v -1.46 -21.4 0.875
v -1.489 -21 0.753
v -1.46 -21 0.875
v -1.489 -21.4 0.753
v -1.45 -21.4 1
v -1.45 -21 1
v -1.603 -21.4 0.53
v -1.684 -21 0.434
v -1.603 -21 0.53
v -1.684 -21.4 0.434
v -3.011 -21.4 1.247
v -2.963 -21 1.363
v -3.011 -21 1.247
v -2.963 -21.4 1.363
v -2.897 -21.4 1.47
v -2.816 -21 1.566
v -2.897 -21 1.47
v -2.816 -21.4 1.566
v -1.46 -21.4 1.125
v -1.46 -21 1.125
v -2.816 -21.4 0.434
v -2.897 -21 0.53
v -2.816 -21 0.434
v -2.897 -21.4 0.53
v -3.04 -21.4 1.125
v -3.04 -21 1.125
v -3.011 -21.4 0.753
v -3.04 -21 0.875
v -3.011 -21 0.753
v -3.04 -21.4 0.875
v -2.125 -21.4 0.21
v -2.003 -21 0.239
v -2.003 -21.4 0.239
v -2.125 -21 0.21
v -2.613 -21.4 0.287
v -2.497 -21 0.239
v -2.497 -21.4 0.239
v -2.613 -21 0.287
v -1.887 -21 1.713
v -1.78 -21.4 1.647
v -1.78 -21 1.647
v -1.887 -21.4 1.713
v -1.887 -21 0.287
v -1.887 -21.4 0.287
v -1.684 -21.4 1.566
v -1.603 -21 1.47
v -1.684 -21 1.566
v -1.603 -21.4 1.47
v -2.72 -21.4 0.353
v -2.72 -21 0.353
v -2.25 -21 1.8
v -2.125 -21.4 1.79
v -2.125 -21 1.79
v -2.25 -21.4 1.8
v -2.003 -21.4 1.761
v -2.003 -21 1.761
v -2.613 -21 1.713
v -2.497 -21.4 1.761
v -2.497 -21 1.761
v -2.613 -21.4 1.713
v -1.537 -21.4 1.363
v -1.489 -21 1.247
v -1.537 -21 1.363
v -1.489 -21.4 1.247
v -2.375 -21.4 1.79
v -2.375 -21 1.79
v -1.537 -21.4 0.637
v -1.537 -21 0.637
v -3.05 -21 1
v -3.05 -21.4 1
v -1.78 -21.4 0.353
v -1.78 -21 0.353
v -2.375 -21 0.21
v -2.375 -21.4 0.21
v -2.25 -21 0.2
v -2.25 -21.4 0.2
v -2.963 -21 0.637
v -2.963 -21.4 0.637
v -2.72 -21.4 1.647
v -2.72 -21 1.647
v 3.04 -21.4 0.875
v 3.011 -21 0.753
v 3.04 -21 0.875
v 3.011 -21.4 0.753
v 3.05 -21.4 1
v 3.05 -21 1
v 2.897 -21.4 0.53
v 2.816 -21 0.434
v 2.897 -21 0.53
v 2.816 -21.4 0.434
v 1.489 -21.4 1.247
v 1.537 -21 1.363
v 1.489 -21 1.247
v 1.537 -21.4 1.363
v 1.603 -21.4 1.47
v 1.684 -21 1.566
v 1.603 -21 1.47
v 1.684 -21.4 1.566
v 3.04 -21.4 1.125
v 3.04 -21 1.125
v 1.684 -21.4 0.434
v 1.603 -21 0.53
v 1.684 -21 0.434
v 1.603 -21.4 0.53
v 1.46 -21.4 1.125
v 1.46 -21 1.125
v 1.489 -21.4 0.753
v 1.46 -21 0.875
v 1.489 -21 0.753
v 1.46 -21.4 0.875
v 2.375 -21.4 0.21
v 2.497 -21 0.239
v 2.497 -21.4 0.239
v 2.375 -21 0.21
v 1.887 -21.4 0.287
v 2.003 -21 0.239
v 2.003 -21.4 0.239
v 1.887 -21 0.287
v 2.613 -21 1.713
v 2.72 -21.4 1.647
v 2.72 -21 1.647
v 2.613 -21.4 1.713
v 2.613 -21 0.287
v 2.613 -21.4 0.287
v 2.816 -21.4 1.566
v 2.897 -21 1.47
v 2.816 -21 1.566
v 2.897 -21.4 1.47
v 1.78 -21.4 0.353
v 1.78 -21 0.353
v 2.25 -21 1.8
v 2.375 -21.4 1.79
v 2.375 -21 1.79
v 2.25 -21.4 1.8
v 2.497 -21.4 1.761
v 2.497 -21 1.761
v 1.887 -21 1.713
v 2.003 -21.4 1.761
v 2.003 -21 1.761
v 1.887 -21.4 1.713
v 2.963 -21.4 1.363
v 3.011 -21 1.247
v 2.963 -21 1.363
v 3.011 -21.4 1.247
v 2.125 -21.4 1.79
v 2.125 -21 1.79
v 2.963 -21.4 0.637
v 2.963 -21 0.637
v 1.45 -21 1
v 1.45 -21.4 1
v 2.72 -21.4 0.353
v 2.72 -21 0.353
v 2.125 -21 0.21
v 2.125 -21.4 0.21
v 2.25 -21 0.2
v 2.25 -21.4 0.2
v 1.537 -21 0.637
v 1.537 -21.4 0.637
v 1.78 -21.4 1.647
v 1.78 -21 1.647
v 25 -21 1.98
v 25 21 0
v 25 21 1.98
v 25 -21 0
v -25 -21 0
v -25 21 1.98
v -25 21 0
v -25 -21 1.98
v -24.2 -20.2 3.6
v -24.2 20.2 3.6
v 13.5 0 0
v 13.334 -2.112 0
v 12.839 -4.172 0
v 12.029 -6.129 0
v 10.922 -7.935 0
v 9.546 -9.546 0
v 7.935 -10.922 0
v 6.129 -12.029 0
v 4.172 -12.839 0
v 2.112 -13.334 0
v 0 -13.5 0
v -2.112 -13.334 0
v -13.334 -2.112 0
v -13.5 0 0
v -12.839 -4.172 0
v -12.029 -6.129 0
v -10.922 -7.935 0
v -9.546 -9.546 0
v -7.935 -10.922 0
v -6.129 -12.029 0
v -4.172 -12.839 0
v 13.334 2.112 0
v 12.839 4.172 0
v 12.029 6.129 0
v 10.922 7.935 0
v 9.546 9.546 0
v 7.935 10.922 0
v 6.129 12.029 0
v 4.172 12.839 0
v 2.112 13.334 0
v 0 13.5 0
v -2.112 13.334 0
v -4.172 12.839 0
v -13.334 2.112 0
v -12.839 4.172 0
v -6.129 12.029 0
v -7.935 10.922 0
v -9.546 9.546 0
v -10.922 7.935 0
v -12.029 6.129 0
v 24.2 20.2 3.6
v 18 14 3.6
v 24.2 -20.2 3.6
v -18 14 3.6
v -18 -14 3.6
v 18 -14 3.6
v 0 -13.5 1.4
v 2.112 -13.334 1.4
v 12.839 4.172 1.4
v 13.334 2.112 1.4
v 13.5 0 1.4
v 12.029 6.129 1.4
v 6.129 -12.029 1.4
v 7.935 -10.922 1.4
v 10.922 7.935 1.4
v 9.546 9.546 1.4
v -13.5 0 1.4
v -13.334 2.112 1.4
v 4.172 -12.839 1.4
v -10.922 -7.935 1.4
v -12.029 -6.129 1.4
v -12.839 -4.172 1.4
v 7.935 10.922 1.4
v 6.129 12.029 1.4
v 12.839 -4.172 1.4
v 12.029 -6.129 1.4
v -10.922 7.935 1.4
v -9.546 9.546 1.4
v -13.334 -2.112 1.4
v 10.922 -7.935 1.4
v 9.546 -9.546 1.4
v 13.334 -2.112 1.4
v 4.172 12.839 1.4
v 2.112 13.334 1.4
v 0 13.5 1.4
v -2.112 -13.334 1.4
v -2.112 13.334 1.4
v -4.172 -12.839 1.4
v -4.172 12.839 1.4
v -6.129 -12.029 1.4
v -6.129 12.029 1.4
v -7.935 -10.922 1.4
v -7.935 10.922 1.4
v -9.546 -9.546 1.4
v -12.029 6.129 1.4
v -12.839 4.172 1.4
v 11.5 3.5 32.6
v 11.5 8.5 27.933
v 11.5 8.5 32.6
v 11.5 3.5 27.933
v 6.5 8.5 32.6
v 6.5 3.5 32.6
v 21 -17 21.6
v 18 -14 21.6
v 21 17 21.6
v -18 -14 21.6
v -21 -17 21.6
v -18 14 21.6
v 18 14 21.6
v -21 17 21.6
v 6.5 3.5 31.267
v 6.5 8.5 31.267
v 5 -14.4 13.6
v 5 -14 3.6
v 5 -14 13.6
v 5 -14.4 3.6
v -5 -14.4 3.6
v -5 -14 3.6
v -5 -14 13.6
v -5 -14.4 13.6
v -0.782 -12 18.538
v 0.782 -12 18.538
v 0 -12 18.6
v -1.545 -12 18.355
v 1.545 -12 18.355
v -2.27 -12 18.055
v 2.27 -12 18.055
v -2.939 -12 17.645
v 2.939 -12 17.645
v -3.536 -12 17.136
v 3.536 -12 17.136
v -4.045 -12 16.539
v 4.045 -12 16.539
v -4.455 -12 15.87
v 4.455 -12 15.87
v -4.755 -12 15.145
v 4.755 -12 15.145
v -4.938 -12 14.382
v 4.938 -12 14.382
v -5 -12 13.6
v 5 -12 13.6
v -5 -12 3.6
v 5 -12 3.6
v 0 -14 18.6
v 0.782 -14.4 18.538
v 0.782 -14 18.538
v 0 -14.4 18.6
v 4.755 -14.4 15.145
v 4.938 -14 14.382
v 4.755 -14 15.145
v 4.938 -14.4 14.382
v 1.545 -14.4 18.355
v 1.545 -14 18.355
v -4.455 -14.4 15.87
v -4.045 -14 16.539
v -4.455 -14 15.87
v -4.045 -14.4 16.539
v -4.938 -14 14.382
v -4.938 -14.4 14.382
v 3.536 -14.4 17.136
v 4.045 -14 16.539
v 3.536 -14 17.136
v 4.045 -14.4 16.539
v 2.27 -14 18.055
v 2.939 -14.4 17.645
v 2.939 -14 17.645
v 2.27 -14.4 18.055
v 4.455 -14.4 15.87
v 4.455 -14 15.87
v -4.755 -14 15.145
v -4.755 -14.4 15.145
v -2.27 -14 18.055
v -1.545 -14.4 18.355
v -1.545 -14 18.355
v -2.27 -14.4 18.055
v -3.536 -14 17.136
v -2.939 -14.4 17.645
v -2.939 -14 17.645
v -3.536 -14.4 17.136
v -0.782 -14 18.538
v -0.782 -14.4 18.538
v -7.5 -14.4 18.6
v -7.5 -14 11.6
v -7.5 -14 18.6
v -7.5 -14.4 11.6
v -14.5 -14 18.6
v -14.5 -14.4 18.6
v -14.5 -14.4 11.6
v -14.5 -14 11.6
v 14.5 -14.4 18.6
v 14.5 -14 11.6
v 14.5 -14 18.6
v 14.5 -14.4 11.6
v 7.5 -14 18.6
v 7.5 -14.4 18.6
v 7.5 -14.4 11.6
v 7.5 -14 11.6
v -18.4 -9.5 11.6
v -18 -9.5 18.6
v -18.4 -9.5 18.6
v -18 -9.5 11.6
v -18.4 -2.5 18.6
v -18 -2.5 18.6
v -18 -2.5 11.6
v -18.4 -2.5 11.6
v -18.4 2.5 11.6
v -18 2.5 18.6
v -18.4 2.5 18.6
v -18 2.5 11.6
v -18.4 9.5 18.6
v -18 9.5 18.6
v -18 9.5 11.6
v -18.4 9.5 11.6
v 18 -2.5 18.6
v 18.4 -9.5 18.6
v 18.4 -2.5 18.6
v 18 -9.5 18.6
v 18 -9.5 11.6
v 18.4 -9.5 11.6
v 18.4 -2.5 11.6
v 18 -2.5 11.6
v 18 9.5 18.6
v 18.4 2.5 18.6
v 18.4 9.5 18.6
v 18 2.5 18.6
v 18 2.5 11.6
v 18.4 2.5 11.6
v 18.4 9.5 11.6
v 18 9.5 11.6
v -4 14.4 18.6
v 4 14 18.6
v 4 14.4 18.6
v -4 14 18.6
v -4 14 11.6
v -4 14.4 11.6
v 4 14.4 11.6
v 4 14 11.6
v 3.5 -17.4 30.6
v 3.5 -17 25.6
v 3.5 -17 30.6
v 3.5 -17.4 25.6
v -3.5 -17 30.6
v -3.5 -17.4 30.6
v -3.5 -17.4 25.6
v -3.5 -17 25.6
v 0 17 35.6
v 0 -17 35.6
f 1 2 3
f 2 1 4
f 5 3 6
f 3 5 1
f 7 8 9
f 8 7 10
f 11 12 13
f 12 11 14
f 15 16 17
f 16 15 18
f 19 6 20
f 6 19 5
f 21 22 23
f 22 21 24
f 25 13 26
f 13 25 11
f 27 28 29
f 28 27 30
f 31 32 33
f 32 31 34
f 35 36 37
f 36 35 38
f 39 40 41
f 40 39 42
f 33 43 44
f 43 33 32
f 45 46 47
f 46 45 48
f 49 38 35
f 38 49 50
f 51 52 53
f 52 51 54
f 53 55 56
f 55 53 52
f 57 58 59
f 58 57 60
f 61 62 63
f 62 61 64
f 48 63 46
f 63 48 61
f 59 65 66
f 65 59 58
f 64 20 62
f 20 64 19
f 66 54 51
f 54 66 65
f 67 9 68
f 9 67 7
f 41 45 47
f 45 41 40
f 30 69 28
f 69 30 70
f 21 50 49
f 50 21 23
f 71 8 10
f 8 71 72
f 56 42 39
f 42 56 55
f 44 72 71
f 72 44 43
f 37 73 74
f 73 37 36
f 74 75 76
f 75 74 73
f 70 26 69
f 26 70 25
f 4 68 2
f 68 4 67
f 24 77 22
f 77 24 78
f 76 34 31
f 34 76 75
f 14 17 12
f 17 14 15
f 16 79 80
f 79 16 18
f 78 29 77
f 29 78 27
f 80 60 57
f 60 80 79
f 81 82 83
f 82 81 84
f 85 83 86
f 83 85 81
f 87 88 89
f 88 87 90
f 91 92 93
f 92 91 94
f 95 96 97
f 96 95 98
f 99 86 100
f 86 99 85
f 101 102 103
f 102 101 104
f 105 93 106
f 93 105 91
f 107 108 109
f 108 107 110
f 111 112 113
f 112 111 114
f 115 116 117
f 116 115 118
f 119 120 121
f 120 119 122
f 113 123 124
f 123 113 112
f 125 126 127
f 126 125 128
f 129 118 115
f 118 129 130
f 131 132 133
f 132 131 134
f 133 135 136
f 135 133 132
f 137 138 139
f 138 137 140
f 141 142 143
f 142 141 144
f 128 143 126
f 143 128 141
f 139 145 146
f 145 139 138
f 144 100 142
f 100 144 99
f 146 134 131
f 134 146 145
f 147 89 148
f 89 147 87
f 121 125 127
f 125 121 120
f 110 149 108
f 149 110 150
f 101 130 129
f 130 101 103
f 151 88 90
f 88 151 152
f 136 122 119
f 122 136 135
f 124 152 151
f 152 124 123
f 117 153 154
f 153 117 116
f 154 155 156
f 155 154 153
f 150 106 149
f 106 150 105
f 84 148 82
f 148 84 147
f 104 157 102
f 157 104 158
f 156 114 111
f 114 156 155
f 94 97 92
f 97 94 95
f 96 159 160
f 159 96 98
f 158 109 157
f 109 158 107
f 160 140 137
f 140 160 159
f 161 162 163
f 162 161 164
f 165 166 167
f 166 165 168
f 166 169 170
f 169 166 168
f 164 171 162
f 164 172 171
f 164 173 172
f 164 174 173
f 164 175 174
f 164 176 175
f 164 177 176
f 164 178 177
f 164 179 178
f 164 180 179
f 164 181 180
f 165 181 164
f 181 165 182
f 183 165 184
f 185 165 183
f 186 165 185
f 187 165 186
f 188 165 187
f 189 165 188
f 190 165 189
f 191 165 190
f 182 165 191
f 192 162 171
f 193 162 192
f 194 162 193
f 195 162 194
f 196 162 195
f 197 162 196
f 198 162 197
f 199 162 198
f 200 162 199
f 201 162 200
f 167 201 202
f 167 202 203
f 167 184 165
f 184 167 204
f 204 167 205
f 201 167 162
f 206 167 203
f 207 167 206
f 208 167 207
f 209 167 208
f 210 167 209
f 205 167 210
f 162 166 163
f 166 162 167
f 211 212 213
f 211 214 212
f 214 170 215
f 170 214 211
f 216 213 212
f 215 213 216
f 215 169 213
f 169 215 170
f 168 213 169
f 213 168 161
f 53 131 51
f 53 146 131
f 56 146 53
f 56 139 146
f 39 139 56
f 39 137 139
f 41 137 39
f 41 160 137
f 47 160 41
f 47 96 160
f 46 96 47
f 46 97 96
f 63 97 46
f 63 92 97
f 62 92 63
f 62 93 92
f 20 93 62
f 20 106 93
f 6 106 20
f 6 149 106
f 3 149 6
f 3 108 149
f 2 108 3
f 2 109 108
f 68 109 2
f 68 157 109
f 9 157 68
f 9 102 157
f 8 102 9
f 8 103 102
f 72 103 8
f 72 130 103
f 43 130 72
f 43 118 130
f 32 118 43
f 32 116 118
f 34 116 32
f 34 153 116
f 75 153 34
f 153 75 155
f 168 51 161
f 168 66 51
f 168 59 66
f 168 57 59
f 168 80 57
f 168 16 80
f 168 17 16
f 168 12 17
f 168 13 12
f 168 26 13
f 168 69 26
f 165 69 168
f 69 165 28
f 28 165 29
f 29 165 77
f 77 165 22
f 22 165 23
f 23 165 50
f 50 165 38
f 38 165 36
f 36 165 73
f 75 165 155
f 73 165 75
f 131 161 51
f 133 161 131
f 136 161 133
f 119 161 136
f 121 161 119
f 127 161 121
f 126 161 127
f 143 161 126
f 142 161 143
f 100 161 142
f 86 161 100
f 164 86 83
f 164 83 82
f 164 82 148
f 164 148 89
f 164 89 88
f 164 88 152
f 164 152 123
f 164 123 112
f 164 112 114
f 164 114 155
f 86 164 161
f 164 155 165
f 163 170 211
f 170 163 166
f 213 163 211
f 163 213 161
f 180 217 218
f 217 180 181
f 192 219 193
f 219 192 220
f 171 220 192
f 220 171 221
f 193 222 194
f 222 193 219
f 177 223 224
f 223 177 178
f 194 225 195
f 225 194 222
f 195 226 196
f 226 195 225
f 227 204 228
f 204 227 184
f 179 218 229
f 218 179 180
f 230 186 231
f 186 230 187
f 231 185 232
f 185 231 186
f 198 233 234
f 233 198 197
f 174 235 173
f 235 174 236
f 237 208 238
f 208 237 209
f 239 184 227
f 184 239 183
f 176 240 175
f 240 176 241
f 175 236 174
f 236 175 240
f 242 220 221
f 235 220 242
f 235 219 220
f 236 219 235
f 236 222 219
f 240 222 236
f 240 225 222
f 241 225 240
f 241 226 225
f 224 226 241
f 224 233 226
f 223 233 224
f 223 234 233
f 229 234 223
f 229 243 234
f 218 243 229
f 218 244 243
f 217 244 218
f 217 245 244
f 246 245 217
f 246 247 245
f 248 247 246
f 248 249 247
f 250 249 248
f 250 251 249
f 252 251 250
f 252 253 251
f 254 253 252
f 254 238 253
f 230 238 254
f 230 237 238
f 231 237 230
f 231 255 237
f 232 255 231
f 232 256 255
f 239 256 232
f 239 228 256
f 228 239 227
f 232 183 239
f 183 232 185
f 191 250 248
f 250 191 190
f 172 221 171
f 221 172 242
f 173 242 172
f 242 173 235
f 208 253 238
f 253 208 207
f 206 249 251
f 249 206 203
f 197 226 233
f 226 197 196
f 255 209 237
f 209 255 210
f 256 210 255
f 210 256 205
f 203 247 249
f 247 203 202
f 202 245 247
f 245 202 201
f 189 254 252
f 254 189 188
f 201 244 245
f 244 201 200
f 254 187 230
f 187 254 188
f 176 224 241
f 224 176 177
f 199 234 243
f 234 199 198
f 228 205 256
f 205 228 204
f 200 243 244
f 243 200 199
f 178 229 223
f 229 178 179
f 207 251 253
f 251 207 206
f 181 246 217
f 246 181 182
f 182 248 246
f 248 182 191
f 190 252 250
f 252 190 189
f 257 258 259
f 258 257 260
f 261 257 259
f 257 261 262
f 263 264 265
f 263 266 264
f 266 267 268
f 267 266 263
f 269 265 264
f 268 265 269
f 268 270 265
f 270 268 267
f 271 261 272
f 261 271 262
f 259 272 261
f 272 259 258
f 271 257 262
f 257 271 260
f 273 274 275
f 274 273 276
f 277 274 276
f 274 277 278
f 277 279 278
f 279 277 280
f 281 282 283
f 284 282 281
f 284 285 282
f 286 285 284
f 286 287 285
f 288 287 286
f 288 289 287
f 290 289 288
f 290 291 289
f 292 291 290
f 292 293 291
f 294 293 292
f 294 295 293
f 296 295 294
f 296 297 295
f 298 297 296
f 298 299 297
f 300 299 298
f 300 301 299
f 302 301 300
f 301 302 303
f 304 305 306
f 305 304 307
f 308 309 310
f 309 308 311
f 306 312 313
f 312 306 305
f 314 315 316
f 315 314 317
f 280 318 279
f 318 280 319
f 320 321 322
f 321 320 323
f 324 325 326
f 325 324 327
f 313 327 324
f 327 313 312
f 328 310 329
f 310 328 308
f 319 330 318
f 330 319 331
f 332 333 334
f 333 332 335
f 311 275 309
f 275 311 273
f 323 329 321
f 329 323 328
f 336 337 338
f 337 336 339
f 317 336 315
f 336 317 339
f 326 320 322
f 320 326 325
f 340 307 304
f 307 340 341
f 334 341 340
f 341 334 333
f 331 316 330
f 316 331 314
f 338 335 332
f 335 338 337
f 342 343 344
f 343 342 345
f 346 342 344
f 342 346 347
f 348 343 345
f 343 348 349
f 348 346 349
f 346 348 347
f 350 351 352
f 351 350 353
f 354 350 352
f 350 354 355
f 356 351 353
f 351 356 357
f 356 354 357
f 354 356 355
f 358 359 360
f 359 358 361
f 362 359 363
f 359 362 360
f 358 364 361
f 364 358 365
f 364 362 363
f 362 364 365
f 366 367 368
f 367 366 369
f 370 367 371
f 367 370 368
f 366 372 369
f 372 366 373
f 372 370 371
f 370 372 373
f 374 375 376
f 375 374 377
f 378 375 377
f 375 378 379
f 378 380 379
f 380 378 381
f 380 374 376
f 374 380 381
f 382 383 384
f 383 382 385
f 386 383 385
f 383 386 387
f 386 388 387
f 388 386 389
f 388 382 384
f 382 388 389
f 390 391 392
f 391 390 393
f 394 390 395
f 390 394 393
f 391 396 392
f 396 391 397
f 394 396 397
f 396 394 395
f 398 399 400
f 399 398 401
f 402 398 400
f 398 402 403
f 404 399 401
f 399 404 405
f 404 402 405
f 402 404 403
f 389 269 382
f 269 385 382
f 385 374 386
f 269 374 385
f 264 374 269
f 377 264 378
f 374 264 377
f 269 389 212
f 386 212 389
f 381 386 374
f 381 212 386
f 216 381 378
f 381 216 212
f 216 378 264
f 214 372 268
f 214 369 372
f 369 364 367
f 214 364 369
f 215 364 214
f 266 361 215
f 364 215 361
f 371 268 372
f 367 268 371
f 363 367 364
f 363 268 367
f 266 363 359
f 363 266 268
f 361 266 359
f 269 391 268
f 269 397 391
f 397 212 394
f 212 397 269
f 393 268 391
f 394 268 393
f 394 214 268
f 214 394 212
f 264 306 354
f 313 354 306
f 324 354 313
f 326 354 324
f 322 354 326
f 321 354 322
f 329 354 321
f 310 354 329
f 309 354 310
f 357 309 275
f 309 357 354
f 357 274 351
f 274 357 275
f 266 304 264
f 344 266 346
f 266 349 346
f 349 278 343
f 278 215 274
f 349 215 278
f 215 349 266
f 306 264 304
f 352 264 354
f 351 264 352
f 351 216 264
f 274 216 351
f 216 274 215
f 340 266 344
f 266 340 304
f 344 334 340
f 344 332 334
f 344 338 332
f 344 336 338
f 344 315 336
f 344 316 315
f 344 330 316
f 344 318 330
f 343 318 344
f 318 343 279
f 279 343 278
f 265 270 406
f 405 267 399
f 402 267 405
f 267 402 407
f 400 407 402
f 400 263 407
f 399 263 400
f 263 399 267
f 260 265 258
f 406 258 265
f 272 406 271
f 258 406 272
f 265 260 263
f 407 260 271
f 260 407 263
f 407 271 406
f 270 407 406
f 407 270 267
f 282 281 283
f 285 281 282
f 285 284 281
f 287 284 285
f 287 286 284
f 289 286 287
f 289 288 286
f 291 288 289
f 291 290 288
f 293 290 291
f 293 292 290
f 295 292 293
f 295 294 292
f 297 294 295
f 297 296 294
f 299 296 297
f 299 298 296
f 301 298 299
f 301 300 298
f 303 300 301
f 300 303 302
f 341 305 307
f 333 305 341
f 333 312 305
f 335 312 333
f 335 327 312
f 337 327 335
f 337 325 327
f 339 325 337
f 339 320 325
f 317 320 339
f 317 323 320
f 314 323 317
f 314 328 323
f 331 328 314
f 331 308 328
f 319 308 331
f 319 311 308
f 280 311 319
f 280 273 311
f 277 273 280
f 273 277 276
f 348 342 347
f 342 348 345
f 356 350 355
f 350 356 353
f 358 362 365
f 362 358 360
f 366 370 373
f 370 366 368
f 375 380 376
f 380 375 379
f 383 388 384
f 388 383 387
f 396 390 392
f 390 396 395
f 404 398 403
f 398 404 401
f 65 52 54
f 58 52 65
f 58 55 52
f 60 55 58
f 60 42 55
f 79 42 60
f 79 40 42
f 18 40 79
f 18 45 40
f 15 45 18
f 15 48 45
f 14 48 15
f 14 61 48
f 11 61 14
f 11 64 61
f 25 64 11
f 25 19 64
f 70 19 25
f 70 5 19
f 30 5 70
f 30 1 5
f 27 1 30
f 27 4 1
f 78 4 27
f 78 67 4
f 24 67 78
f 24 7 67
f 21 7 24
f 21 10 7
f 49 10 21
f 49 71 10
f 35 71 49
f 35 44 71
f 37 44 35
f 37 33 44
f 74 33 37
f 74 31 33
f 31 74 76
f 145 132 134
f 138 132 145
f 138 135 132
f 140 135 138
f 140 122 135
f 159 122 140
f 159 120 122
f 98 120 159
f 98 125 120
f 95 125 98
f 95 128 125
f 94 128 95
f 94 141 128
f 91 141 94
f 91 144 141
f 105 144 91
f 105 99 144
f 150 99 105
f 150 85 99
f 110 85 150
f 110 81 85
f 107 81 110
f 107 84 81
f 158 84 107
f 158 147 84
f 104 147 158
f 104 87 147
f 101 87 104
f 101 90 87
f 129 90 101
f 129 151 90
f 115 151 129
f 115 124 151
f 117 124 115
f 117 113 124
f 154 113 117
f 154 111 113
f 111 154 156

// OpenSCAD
// file: lib.scad
// BDL Pets - gemeinsame Bausteine fuer die 5 Haus-Stufen
//
// Alle Haeuser sind in genau 4 Farbslots aufgeteilt (Multicolor-Druck, z.B. Bambu AMS / Prusa MMU):
//   1 Stein/Sockel   2 Waende   3 Dach   4 Akzente (Tueren, Fenster, Pfosten, Stufen-Punkte)
// Die Teile ueberlappen nicht (Oeffnungen werden aus der einen Farbe geschnitten und in der anderen gefuellt),
// jeder Farbslot laesst sich einzeln als STL exportieren:  openscad -D part=1 -o x_c1.stl house-1-huette.scad
//   part = 0 -> Vorschau in Farbe, 1..4 -> nur dieser Farbslot
//
// Unten (Sockel) ist mittig eine runde Ausnehmung fuer einen NFC-Sticker (Durchmesser 25 mm) ausgespart:
// Sticker von unten einkleben, buendig mit der Unterseite, 2.2 mm Kunststoff darueber (Lesen durch das Haus).

$fn = 40;

PH = 3.6;           // Sockelhoehe (mm)
NFC_D = 27;         // Ausnehmung: 25 mm Sticker + Spiel
NFC_DEPTH = 1.4;    // Tiefe von unten (NTAG-Sticker ~0.3-0.6 mm dick + Kleber) -> Restdecke = PH - NFC_DEPTH
PALETTE = ["#8c9097", "#eadfc4", "#a5432f", "#33415f"];

module pc(i, part) {
    if (part == 0) color(PALETTE[i - 1]) children();
    else if (part == i) children();
}

// ---------------------------------------------------------------- Sockel (Farbe 1)
module plinth(w, d, tier) {
    difference() {
        hull() {
            translate([-w / 2, -d / 2, 0]) cube([w, d, PH * 0.55]);
            translate([-w / 2 + 0.8, -d / 2 + 0.8, 0]) cube([w - 1.6, d - 1.6, PH]);
        }
        translate([0, 0, -0.01]) cylinder(d = NFC_D, h = NFC_DEPTH + 0.01);   // NFC-Sticker
        tier_dots(w, d, tier, false);
    }
}

// Stufen-Punkte an der Sockel-Vorderseite: 1 Punkt = Huette ... 5 Punkte = Villa (Farbe 4 fuellt sie)
module tier_dots(w, d, tier, fill) {
    for (i = [0 : tier])
        translate([(i - tier / 2) * 4.5, -d / 2 - (fill ? 0.4 : 1), 1.0])
            rotate([-90, 0, 0]) cylinder(d = 1.6, h = fill ? 1.4 : 2);
}

// ---------------------------------------------------------------- Koerper
module box(w, d, h, z0, cx = 0, cy = 0) {
    translate([cx - w / 2, cy - d / 2, z0]) cube([w, d, h]);
}

// Satteldach, First entlang Y (Giebel zeigt nach vorn)
module gable(w, d, h, z0, over, cx = 0, cy = 0) {
    translate([cx, cy + (d + 2 * over) / 2, z0]) rotate([90, 0, 0])
        linear_extrude(d + 2 * over) polygon([[-w / 2 - over, 0], [w / 2 + over, 0], [0, h]]);
}

// Walmdach, First entlang X
module hip(w, d, h, z0, over, ridge, cx = 0, cy = 0) {
    hull() {
        translate([cx - w / 2 - over, cy - d / 2 - over, z0]) cube([w + 2 * over, d + 2 * over, 0.01]);
        translate([cx - ridge / 2, cy - 0.4, z0 + h - 0.01]) cube([ridge, 0.8, 0.01]);
    }
}

// ---------------------------------------------------------------- Oeffnungen (Tueren/Fenster)
// Ursprung = Unterkante Mitte, ragt von der Wandflaeche (y=0) nach innen (+y).
// fill=false: Schneidkoerper (steht 1 mm ueber), fill=true: Einsatz aus Farbe 4 (steht 0.4 mm vor)
module opening(w, h, d = 2, arch = false, fill = false) {
    out = fill ? 0.4 : 1;
    translate([0, -out, 0]) {
        if (arch) {
            translate([-w / 2, 0, 0]) cube([w, out + d, h - w / 2]);
            translate([0, 0, h - w / 2]) rotate([-90, 0, 0]) cylinder(d = w, h = out + d);
        } else {
            translate([-w / 2, 0, 0]) cube([w, out + d, h]);
        }
    }
}

// Auf eine Wand setzen. `face` = Abstand der Wandflaeche von der Mitte
module on_front(x, z, face) { translate([x, -face, z]) children(); }
module on_back(x, z, face) { translate([x, face, z]) rotate([0, 0, 180]) children(); }
module on_left(y, z, face) { translate([-face, y, z]) rotate([0, 0, -90]) children(); }
module on_right(y, z, face) { translate([face, y, z]) rotate([0, 0, 90]) children(); }

module on_side(k, y, z, face) {   // k = 0 links, 1 rechts
    if (k == 0) on_left(y, z, face) children();
    else on_right(y, z, face) children();
}
// main file
// Stufe 2: Bauernhaus - 2 Plaetze, Zufriedenheit -30/Tag. Satteldach mit Kamin.
include <lib.scad>

H2_P = [50, 42];
H2_W = 36; H2_D = 28; H2_H = 18; H2_RH = 14; H2_OV = 3;

module h2_openings(fill) {
    z = PH;
    on_front(0, z, H2_D / 2) opening(10, 15, 2, true, fill);
    for (x = [-11, 11]) on_front(x, z + 8, H2_D / 2) opening(7, 7, 2, false, fill);
    for (k = [0, 1], y = [-6, 6]) on_side(k, y, z + 8, H2_W / 2) opening(7, 7, 2, false, fill);
    on_back(0, z + 8, H2_D / 2) opening(8, 7, 2, false, fill);
    on_front(0, z + H2_H + 4, H2_D / 2 + H2_OV) opening(7, 5, 2.5, false, fill);   // Heuboden-Fenster
}

module h2_chimney() { box(5, 5, 11, PH + H2_H, 9, 6); }

module house2(part = 0) {
    pc(1, part) { plinth(H2_P[0], H2_P[1], 1); h2_chimney(); }
    pc(2, part) difference() { box(H2_W, H2_D, H2_H, PH); h2_openings(false); }
    pc(3, part) difference() {
        gable(H2_W, H2_D, H2_RH, PH + H2_H, H2_OV);
        h2_openings(false);
        h2_chimney();
    }
    pc(4, part) { h2_openings(true); tier_dots(H2_P[0], H2_P[1], 1, true); }
}

part = 0;
house2(part);
